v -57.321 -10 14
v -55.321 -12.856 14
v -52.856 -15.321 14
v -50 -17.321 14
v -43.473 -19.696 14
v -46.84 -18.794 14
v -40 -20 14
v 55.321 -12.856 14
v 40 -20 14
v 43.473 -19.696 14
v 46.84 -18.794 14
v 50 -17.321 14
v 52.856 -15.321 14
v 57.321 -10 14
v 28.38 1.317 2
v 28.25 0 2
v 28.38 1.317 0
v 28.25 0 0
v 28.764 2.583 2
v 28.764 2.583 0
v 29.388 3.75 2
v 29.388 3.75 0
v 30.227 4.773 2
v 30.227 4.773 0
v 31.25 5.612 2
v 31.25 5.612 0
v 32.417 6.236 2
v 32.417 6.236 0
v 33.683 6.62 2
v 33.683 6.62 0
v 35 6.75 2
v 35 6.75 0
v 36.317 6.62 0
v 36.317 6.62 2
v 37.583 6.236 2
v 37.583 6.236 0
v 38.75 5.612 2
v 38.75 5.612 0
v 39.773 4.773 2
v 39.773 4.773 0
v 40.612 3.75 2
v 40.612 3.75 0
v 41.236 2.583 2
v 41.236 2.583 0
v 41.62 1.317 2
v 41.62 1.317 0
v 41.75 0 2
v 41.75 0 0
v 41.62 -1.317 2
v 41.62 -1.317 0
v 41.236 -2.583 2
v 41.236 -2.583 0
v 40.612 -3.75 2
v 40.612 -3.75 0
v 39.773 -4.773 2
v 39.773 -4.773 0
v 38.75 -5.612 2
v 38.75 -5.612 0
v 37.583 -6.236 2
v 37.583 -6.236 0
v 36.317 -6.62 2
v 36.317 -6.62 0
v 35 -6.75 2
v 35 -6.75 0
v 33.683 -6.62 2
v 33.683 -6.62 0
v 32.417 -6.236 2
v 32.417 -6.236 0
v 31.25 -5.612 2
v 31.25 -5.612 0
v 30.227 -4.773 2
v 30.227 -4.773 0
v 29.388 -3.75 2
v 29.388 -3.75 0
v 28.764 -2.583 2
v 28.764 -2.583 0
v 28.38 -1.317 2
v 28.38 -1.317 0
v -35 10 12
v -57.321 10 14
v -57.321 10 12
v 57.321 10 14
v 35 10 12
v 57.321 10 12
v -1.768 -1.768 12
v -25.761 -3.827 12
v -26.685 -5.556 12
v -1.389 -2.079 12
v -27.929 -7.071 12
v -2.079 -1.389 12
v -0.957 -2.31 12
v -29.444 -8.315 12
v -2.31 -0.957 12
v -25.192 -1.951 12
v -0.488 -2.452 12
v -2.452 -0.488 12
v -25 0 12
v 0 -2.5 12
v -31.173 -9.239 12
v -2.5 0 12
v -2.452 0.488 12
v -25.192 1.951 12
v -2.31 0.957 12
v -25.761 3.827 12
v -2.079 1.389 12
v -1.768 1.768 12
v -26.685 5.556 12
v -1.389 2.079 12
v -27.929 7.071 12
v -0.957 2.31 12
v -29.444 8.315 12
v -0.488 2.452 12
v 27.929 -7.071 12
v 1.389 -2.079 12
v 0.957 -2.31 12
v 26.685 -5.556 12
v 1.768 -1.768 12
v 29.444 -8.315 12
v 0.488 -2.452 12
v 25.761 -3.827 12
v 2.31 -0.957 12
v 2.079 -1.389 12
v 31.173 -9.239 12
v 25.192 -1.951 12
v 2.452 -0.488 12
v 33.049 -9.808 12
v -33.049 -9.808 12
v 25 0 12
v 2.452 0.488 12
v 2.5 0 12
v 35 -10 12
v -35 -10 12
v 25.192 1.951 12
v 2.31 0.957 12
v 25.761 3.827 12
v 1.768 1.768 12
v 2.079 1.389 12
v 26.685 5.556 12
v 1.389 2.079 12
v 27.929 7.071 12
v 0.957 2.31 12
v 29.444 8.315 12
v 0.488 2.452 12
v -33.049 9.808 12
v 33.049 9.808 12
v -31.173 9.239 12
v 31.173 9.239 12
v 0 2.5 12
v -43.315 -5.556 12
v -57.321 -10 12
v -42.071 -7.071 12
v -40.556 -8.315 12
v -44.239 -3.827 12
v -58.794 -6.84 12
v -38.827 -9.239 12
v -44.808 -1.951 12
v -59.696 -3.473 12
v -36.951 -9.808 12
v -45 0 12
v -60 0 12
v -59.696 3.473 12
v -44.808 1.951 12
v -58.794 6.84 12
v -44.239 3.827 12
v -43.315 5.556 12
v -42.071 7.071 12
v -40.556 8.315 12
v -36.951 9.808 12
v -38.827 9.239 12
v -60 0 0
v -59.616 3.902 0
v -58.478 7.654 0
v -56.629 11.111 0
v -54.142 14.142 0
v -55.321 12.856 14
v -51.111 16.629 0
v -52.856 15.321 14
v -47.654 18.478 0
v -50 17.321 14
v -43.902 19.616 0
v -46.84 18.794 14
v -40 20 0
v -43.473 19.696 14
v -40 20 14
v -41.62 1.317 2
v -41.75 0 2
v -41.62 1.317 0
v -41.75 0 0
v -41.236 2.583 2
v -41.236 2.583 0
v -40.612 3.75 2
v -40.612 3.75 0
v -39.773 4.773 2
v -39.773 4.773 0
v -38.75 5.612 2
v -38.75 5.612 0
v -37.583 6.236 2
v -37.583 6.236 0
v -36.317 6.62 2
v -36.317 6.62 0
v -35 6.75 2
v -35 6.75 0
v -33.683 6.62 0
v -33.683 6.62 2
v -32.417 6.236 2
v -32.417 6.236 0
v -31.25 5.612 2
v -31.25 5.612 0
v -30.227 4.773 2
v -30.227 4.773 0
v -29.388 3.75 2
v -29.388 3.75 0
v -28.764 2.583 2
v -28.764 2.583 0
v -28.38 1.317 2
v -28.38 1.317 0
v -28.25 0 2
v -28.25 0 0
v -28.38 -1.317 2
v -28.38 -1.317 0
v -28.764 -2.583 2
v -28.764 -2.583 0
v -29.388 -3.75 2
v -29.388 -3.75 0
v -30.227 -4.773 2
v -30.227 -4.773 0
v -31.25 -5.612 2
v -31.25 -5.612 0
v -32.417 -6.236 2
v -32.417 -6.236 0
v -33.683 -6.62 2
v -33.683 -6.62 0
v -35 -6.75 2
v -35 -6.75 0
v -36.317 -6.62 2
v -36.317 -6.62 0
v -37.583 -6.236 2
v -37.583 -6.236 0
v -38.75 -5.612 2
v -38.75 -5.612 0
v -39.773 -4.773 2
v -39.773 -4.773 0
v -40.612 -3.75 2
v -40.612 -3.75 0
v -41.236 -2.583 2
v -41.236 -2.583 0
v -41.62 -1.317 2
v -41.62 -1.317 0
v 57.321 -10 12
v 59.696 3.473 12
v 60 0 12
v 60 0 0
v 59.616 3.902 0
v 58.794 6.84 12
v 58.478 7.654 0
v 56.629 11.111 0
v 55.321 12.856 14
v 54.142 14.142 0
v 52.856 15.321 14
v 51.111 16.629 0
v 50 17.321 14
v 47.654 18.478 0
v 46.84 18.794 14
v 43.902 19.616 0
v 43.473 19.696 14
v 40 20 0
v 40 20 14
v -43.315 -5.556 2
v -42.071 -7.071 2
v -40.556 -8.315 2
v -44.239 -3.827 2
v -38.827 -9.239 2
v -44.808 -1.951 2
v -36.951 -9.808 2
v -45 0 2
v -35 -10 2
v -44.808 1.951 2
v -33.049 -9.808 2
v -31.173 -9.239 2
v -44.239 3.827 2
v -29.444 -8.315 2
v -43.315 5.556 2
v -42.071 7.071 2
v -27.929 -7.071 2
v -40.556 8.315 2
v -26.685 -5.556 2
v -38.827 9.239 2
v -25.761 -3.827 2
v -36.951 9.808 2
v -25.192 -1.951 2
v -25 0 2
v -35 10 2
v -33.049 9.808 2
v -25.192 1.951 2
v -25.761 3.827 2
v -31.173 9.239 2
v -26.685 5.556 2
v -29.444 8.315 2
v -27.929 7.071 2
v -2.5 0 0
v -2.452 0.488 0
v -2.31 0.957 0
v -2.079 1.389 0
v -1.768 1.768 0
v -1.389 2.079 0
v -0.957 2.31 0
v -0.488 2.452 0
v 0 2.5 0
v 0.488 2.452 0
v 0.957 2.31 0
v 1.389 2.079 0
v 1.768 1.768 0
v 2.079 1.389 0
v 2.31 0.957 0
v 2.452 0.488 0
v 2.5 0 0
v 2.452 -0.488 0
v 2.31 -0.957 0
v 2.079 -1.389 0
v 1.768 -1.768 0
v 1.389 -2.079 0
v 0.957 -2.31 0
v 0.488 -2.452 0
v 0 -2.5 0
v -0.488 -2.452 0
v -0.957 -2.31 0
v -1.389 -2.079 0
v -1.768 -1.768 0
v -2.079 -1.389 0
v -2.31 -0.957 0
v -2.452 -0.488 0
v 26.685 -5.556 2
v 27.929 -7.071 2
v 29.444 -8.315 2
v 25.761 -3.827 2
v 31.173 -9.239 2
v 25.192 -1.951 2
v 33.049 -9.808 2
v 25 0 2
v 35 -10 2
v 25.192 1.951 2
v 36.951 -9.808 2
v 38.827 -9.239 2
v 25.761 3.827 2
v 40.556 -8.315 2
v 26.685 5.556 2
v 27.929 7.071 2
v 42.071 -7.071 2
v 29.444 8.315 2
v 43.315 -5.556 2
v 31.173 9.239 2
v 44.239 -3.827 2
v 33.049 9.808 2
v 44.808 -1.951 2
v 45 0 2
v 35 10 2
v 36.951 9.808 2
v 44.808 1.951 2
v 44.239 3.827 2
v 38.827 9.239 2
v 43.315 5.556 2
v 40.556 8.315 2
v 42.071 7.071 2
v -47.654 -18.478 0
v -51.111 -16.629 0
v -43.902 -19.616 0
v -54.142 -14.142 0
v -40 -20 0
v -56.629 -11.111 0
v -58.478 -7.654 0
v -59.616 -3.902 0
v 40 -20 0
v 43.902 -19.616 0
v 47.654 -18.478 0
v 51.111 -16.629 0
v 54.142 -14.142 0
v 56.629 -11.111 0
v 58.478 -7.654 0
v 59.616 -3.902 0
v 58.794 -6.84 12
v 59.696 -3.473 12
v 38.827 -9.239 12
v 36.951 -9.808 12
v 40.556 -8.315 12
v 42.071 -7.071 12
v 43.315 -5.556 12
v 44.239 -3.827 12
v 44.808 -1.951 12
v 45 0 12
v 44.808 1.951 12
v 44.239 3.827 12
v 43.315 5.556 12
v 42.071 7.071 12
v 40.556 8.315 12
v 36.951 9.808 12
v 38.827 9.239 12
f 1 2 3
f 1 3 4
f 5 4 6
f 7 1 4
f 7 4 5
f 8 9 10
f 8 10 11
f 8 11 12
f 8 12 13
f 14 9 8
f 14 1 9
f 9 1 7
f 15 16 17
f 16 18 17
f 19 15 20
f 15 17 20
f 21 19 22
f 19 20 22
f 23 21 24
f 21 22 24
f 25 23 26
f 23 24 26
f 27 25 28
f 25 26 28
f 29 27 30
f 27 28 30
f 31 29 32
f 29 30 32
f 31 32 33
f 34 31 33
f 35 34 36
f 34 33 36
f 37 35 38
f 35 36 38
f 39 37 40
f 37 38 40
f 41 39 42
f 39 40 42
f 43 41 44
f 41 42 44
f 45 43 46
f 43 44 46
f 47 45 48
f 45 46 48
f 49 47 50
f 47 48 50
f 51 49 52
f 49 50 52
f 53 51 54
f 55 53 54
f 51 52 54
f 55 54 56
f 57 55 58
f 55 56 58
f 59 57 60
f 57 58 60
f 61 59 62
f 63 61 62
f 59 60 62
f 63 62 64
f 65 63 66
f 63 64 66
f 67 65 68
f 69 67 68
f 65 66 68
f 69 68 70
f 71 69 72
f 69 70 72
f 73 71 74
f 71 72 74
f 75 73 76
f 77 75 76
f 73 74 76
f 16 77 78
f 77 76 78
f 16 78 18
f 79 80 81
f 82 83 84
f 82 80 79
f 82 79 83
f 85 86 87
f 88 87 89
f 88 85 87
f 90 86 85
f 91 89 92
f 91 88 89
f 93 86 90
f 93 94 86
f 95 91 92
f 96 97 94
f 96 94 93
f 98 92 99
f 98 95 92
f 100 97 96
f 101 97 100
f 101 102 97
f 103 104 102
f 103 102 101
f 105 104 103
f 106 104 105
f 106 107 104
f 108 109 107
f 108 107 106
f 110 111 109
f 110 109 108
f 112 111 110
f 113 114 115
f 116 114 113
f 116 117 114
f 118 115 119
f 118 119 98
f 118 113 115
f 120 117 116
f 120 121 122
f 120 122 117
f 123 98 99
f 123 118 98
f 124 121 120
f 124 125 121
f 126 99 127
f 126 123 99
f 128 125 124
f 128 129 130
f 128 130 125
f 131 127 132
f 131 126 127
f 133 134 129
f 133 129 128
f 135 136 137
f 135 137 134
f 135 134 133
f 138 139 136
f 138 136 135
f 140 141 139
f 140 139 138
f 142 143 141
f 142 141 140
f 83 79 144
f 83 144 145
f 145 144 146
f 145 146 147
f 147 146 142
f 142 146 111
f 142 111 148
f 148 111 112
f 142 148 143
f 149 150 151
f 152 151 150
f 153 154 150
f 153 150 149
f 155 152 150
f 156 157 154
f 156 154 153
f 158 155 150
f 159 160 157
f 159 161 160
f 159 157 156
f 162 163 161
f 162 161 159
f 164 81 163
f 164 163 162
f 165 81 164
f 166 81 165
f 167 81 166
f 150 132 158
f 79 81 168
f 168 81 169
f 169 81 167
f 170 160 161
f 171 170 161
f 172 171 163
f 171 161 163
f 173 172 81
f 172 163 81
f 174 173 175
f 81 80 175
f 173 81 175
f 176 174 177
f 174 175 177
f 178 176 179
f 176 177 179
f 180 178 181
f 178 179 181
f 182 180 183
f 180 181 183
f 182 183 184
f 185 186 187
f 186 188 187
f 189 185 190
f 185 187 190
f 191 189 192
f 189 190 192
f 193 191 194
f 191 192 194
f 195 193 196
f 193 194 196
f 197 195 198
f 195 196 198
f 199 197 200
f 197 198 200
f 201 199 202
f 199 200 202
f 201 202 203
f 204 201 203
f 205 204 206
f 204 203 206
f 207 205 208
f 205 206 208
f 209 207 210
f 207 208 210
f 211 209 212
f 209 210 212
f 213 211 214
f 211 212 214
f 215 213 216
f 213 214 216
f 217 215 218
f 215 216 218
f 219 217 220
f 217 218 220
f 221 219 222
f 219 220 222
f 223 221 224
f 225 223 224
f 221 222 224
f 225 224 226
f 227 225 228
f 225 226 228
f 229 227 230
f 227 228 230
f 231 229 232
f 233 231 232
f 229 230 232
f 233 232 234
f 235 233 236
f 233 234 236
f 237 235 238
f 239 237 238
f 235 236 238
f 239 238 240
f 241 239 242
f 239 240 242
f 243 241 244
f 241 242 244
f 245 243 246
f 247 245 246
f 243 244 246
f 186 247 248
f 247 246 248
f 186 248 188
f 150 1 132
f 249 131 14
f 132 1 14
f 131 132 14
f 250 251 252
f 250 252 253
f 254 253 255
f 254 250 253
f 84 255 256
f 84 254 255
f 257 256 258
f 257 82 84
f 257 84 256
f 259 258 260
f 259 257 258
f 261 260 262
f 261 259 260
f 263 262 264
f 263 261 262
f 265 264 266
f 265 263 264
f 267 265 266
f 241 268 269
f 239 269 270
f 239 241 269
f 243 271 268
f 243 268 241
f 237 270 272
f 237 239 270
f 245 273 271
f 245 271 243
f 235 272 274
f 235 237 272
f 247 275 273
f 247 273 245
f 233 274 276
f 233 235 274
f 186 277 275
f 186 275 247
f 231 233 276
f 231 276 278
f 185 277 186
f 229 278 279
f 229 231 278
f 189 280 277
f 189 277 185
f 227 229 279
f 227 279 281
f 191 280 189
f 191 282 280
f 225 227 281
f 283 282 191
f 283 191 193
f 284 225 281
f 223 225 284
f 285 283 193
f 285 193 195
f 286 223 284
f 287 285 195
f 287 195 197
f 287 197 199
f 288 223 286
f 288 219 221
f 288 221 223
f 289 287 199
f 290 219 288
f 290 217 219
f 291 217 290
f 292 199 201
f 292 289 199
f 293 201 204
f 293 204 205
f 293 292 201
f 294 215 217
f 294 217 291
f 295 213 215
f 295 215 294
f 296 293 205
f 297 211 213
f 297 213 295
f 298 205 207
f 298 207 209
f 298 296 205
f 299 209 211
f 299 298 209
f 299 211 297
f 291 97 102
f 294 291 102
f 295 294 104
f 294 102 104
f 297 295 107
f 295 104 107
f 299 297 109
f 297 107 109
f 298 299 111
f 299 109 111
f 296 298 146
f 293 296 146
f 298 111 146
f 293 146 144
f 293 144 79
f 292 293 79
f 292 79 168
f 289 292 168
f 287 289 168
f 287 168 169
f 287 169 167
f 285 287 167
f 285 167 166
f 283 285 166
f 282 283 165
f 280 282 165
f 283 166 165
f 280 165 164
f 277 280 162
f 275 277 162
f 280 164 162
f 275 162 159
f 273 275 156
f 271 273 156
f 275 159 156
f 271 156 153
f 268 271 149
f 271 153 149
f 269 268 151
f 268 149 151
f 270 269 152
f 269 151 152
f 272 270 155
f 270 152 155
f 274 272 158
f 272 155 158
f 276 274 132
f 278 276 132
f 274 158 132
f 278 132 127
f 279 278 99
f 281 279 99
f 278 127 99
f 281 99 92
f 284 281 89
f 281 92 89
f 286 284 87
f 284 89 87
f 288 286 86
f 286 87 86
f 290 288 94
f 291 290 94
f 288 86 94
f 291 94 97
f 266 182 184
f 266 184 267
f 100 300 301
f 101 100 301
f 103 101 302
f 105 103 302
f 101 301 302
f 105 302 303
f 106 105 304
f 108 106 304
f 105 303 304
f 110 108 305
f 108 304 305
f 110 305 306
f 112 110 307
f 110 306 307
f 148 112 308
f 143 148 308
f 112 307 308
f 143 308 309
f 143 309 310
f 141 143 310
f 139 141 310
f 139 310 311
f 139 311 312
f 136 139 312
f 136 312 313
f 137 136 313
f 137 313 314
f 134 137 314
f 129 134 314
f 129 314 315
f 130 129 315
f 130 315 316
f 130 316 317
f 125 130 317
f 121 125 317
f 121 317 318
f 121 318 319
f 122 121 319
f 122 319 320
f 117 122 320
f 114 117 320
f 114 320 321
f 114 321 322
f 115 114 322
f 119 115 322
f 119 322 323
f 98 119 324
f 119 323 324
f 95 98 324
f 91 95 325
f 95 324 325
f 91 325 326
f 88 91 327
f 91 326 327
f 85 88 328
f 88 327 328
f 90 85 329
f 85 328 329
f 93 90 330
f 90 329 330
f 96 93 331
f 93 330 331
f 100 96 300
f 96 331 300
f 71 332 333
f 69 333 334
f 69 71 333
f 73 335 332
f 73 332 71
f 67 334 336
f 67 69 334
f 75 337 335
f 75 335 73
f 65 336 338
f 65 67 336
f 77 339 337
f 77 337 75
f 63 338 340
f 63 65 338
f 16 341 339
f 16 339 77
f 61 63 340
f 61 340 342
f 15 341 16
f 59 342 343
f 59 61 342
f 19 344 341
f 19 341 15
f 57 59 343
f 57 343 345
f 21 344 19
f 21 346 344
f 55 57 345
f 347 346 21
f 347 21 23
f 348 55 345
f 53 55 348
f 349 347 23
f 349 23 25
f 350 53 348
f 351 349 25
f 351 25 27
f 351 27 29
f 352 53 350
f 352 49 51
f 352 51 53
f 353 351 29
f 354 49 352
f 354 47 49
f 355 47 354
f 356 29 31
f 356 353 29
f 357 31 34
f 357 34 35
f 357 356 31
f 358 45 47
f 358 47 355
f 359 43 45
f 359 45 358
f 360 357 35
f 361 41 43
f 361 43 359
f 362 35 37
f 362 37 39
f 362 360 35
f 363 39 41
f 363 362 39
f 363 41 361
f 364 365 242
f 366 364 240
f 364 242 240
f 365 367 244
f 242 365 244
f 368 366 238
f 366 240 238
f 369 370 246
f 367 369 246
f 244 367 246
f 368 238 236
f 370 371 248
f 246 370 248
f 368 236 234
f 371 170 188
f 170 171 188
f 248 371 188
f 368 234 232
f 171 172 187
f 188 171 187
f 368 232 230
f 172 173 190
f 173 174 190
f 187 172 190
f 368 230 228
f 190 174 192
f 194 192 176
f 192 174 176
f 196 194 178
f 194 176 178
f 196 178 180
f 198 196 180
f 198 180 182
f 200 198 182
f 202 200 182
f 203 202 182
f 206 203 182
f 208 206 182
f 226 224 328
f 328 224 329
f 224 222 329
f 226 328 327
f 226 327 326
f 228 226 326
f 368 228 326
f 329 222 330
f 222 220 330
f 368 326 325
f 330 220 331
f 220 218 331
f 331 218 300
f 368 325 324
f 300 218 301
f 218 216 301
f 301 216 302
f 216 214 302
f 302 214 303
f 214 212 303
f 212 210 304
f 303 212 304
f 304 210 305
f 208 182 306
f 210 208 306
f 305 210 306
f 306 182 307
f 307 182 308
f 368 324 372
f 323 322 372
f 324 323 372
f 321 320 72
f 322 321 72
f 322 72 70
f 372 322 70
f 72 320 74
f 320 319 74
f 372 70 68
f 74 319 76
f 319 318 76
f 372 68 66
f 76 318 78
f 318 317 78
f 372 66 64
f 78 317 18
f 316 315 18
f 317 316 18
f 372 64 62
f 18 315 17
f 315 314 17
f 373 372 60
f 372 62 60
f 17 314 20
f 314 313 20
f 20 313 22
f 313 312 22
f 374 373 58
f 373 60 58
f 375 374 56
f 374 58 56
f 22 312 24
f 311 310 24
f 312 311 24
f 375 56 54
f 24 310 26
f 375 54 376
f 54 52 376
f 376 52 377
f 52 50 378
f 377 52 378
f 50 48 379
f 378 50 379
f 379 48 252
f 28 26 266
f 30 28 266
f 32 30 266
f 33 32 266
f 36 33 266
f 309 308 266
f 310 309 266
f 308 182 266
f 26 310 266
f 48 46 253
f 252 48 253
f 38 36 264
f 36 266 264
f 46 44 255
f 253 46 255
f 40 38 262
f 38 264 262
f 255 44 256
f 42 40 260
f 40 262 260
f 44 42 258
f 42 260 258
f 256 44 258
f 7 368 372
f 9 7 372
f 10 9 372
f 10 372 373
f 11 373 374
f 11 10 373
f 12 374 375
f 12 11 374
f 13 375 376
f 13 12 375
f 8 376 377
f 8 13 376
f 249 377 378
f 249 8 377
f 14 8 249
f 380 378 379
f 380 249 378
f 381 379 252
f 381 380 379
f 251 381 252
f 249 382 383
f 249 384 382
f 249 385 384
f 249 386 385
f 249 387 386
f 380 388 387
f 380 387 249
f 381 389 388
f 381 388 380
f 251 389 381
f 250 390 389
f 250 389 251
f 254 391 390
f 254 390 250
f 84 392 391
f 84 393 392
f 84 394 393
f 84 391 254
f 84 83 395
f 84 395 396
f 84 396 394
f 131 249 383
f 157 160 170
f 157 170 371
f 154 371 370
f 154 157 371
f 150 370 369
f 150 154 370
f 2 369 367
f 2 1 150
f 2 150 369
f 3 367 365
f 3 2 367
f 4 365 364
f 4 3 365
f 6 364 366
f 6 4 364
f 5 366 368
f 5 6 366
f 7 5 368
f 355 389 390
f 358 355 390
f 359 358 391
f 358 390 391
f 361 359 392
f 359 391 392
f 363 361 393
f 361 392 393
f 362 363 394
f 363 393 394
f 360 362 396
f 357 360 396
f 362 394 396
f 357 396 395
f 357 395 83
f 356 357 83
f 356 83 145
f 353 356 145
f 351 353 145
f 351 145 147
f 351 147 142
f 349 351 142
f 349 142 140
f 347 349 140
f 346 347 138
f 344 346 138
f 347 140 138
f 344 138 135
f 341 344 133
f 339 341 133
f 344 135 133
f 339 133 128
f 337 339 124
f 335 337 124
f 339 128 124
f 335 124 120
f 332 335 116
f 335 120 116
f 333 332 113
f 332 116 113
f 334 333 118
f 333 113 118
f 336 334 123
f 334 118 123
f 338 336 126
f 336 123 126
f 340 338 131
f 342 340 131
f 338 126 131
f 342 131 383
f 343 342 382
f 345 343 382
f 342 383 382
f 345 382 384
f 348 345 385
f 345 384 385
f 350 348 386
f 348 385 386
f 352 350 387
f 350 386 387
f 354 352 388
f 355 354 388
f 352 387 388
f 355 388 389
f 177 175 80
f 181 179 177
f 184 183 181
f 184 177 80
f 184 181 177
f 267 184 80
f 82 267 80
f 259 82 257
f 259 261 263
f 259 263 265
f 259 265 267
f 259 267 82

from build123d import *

# Parameters (mm, degrees)
SKETCH_1_W                    = 120
SKETCH_1_H                    = 40
EXTRUDE_1_DEPTH               = 14
SKETCH_2_W                    = 120
SKETCH_2_H                    = 20
CUT_EXTRUDE_1_DEPTH           = 2
HOLE_WIZARD_M12_1_D           = 13.5
HOLE_WIZARD_M12_1_CBORE_D     = 20
HOLE_WIZARD_M12_1_CBORE_DEPTH = 10
FILLET_1_R                    = 20
HOLE_WIZARD_M6_1_D            = 5


with BuildPart() as part:
    # 草图1 → 凸台-拉伸1 (new body)
    with BuildSketch(Plane.XY):
        Rectangle(SKETCH_1_W, SKETCH_1_H)
    extrude(amount=EXTRUDE_1_DEPTH)

    # 草图2 → 切除-拉伸1 (cut)
    with BuildSketch(Plane.XY.offset(14)):
        Rectangle(SKETCH_2_W, SKETCH_2_H)
    extrude(amount=-CUT_EXTRUDE_1_DEPTH, mode=Mode.SUBTRACT)

    # M12 六角头螺栓的柱形沉头孔1 (through all)
    with Locations(Plane.XY.offset(12)):
        with Locations((-35, 0), (35, 0)):
            CounterBoreHole(HOLE_WIZARD_M12_1_D / 2, HOLE_WIZARD_M12_1_CBORE_D / 2, HOLE_WIZARD_M12_1_CBORE_DEPTH)

    # 圆角1
    fillet_1_edges = [part.edges().sort_by_distance(p)[0] for p in [
        (60, 20, 7),
        (60, -20, 7),
        (-60, -20, 7),
        (-60, 20, 7),
    ]]
    fillet(fillet_1_edges, radius=FILLET_1_R - 0.0001)  # a hair under: the kernel refuses the full size

    # M6 螺纹孔1 (through all)
    with Locations(Plane.XY.offset(12)):
        with Locations((0, 0)):
            Hole(HOLE_WIZARD_M6_1_D / 2)


solid = part.part
